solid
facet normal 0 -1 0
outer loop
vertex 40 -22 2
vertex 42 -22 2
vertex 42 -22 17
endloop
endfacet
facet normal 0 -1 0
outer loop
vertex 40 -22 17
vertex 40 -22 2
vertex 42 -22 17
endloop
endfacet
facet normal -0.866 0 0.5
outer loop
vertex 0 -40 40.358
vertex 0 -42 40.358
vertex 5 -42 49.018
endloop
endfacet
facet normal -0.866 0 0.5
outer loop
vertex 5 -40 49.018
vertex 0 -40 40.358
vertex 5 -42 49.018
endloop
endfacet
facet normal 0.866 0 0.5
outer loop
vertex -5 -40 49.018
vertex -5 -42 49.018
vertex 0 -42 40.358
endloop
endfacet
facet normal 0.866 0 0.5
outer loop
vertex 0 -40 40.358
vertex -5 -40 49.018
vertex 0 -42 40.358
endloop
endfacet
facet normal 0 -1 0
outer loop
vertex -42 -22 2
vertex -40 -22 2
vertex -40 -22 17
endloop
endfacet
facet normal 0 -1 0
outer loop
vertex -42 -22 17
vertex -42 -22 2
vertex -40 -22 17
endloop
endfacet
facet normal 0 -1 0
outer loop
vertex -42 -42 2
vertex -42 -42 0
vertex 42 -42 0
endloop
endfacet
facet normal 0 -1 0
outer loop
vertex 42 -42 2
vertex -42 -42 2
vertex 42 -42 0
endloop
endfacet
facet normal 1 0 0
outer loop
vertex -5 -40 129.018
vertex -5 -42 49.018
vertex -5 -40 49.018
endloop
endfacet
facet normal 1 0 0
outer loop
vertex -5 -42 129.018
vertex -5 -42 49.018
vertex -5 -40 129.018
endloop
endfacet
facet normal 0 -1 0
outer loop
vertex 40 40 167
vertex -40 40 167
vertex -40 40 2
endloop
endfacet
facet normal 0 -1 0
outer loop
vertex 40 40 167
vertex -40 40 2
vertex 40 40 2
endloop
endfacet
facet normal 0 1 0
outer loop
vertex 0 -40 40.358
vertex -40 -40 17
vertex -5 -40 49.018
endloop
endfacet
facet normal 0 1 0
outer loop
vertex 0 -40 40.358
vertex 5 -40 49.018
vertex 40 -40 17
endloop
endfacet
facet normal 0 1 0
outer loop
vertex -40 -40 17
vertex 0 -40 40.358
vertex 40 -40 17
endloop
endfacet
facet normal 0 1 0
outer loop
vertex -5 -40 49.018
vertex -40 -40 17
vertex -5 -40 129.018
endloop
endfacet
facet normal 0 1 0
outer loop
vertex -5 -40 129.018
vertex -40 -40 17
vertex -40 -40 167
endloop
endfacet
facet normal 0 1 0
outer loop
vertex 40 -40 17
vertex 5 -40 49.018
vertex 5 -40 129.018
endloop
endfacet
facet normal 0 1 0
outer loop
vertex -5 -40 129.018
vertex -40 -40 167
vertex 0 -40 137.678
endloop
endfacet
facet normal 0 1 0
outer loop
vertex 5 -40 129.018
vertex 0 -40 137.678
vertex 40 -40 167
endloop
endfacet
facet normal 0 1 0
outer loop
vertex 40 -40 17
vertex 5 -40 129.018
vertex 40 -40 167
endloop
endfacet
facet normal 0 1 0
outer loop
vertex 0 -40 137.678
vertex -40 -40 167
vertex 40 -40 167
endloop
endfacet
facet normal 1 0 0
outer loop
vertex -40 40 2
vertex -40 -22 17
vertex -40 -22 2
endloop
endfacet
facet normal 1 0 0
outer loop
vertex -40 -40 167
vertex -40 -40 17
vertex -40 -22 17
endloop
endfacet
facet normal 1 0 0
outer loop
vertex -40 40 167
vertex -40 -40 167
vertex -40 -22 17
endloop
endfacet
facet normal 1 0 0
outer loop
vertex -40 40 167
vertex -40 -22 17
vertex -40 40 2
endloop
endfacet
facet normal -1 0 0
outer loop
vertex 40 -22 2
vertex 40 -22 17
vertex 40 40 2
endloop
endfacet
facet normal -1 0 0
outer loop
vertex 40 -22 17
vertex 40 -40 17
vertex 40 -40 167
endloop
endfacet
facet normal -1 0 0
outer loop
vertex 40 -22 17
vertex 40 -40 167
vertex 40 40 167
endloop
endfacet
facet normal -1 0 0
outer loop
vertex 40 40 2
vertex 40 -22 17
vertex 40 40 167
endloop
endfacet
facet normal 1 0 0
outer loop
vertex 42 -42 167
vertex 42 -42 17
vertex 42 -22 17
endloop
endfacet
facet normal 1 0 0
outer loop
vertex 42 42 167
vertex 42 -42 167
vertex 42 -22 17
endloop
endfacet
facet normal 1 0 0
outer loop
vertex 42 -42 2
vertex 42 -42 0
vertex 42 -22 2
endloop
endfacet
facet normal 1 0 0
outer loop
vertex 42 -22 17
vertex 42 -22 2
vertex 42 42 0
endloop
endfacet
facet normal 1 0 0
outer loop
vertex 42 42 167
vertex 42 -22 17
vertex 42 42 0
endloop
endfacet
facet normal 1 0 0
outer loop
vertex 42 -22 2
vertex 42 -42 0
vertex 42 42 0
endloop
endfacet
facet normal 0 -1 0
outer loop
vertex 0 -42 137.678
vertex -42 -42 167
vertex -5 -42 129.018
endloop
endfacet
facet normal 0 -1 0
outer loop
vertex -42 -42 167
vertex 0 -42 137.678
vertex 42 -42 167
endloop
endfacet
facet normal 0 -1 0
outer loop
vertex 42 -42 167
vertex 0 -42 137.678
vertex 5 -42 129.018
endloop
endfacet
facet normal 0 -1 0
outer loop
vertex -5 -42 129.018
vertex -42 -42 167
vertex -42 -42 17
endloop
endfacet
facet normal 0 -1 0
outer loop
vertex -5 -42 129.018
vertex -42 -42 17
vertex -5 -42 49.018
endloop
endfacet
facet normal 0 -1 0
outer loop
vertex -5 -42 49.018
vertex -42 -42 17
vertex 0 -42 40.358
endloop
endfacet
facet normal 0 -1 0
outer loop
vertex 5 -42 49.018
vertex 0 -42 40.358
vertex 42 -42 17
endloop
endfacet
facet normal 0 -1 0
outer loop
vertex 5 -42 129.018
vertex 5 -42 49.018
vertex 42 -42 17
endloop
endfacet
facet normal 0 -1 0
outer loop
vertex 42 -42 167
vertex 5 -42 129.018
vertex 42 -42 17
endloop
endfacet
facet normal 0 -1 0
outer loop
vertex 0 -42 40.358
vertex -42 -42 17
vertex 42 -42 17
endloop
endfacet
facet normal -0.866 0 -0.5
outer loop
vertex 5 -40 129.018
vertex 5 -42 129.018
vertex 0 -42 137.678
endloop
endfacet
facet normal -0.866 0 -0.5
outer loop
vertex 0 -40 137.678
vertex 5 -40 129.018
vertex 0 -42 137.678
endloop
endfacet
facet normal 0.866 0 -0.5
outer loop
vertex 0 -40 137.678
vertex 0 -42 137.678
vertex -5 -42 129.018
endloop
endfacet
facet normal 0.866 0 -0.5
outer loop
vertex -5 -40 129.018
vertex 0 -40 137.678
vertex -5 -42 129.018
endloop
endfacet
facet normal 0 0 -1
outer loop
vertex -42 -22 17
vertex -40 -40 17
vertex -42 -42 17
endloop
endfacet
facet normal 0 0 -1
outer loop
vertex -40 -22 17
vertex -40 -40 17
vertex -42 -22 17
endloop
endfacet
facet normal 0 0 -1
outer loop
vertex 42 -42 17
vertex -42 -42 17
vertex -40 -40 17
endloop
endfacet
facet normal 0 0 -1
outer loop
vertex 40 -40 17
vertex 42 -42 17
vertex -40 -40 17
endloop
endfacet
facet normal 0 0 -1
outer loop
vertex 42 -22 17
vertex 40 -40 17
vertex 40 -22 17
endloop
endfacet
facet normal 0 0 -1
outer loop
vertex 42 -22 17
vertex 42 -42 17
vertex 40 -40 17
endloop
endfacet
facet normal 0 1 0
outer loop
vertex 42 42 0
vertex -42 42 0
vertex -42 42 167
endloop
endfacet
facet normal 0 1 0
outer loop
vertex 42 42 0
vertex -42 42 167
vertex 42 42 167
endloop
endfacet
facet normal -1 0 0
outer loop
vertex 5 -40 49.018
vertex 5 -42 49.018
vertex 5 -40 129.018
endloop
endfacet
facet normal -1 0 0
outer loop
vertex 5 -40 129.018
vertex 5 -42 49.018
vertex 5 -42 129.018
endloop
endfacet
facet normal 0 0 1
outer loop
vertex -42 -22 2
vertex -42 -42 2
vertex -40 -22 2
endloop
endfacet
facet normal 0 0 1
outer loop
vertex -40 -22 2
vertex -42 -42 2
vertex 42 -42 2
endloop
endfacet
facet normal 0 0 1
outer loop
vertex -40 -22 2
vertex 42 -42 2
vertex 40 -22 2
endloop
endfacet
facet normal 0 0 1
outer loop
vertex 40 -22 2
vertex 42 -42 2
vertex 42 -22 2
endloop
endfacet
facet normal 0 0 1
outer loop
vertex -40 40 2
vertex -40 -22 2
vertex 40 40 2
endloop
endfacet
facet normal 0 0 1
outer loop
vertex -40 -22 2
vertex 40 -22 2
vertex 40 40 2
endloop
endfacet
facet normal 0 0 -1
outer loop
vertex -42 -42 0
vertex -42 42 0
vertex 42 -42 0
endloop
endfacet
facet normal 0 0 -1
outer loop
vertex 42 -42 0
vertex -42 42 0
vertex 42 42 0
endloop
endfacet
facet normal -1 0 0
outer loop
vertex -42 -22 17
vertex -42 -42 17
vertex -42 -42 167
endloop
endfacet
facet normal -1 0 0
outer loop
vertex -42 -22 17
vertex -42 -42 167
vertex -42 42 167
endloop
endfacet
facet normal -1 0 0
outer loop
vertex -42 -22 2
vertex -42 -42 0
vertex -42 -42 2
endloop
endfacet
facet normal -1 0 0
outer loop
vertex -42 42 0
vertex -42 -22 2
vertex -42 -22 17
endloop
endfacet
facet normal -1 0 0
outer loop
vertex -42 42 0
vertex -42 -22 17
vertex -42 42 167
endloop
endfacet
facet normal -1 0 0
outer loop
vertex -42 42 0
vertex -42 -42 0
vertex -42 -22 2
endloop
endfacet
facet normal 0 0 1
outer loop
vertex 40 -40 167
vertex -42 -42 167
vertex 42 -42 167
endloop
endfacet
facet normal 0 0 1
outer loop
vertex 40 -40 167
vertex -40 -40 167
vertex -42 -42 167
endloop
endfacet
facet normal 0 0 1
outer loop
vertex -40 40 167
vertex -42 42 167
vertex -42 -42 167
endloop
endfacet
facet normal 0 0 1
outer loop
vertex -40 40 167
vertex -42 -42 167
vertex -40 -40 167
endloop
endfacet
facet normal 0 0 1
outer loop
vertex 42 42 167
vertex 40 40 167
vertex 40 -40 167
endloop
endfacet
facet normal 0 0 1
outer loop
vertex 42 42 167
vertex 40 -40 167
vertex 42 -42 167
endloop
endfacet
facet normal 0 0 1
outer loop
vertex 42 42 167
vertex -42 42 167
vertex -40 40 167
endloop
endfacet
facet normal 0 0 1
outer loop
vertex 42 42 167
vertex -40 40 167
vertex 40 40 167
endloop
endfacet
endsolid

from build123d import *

# Parameters (mm, degrees)
F0_W     = 84
F0_H     = 84
F1_DEPTH = 167
F2_W     = 80
F2_H     = 80
F3_DEPTH = 165
F4_W     = 20
F4_H     = 15
F5_DEPTH = 84
F6_W     = 10
F6_H     = 80
F7_DEPTH = 2


with BuildPart() as f1:
    # F0 (on Top) → F1 (new body)
    with BuildSketch(Plane.XY):
        Rectangle(F0_W, F0_H)
    extrude(amount=F1_DEPTH)

    # F2 (on face) → F3 (cut)
    with BuildSketch(Plane.XY.offset(167)):
        Rectangle(F2_W, F2_H)
    extrude(amount=-F3_DEPTH, mode=Mode.SUBTRACT)

    # F4 (on face) → F5 (cut)
    with BuildSketch(Plane.YZ.offset(42)):
        with Locations((-32, 9.5)):
            Rectangle(F4_W, F4_H)
    extrude(amount=-F5_DEPTH, mode=Mode.SUBTRACT)

    # F6 (on face) → F7 (cut)
    with BuildSketch(Plane.XZ.offset(42)):
        Polygon((5, 49.017786), (-5, 49.017786), (0, 40.357532), align=None)
        with Locations((0, 89.017786)):
            Rectangle(F6_W, F6_H)
        Polygon((0, 137.67804), (-5, 129.017786), (5, 129.017786), align=None)
    extrude(amount=-F7_DEPTH, mode=Mode.SUBTRACT)


solid = f1.part
